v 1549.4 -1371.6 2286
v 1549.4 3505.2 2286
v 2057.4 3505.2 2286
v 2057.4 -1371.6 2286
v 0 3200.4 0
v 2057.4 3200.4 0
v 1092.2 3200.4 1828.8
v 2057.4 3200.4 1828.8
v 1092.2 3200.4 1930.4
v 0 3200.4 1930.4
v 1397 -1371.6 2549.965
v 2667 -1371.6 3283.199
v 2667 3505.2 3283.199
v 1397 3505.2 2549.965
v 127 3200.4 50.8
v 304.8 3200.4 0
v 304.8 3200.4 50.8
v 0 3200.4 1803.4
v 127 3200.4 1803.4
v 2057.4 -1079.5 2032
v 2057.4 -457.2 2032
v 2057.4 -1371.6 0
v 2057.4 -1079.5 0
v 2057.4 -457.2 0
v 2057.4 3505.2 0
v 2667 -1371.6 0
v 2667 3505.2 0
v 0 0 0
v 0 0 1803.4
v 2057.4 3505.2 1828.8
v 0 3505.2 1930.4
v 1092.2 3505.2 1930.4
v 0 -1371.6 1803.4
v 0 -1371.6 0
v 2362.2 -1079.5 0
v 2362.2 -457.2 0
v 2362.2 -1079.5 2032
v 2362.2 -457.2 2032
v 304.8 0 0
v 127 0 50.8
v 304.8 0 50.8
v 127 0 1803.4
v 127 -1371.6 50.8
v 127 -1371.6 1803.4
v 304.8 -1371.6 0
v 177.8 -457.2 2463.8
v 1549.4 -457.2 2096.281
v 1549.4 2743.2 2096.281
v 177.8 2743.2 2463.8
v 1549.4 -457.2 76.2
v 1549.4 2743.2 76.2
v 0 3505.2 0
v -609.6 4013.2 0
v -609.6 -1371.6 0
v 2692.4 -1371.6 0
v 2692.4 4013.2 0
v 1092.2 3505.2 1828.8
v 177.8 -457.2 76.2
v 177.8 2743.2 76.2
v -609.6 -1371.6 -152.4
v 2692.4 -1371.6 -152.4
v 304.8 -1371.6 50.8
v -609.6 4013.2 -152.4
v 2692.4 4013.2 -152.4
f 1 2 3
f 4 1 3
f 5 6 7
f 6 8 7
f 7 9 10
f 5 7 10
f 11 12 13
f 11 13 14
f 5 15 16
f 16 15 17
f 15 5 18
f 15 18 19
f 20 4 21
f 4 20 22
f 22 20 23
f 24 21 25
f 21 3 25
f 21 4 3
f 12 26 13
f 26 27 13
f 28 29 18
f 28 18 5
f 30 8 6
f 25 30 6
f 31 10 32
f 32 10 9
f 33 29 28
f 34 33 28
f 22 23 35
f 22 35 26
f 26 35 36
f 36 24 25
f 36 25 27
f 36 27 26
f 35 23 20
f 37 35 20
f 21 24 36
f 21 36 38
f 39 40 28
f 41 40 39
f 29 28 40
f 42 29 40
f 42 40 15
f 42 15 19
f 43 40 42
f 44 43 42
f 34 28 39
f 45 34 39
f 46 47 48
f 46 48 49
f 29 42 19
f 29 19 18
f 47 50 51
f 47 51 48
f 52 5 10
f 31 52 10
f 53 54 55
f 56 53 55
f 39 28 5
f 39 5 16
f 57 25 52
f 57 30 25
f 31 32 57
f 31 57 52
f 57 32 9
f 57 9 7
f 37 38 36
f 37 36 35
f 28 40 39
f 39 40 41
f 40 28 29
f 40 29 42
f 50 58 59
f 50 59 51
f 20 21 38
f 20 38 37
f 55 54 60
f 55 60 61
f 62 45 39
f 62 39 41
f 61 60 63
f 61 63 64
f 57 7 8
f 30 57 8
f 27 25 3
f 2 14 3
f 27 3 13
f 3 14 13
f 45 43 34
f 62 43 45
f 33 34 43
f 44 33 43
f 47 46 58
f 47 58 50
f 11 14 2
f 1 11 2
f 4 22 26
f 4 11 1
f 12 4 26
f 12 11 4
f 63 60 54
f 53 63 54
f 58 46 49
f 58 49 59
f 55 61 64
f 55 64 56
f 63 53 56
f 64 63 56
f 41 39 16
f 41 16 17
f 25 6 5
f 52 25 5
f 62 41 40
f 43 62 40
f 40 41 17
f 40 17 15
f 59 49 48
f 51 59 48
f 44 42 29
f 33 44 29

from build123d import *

# Parameters (mm, degrees)
F1_DEPTH  = 3200.4
F3_DEPTH  = 3505.2
F5_DEPTH  = 304.8
F8_DEPTH  = 1371.6
F9_W      = 3302
F9_H      = 152.4
F10_DEPTH = 5384.8
F12_DEPTH = 1371.6
F13_W     = 622.3
F13_H     = 2032
F14_DEPTH = 304.8
F17_DEPTH = 3200.4


with BuildPart() as f1:
    # F0 (on Front) → F1 (new body)
    with BuildSketch(Plane.XZ):
        Polygon((0, 1803.4), (0, 0), (304.8, 0), (304.8, 50.8), (127, 50.8), (127, 1803.4), align=None)
    extrude(amount=-F1_DEPTH)


with BuildPart() as f3:
    # F2 (on Front) → F3 (new body)
    with BuildSketch(Plane.XZ):
        Polygon((2057.4, 2286), (2057.4, 0), (2667, 0), (2667, 3283.1993849443), (1397, 2549.9645430735), (1549.4, 2286), align=None)
    extrude(amount=-F3_DEPTH)

    # F7 (on face) → F8 (join, through all)
    with BuildSketch(Plane.XZ):
        Polygon((1549.4, 2286), (2057.4, 2286), (2057.4, 0), (2667, 0), (2667, 3283.1993849443), (1397, 2549.9645430735), align=None)
    extrude(amount=F8_DEPTH)

    # F13 (on face) → F14 (cut)
    with BuildSketch(Plane(origin=(2057.4, 0, 0), x_dir=(0, -1, 0), z_dir=(-1, 0, 0))):
        with Locations((768.35, 1016)):
            Rectangle(F13_W, F13_H)
    extrude(amount=-F14_DEPTH, mode=Mode.SUBTRACT)


with BuildPart() as f5:
    # F4 (on face) → F5 (new body)
    with BuildSketch(Plane(origin=(0, 3200.4, 0), x_dir=(-1, 0, 0), z_dir=(0, 1, 0))):
        Polygon((-2057.4, 0), (0, 0), (0, 1930.4), (-1092.2, 1930.4), (-1092.2, 1828.8), (-2057.4, 1828.8), align=None)
    extrude(amount=F5_DEPTH)


with BuildPart() as f10:
    # F9 (on offset) → F10 (new body)
    with BuildSketch(Plane.XZ.offset(1371.6)):
        with Locations((1041.4, -76.2)):
            Rectangle(F9_W, F9_H)
    extrude(amount=-F10_DEPTH)


with BuildPart() as f12:
    # F11 (on face) → F12 (new body, through all)
    with BuildSketch(Plane.XZ):
        Polygon((304.8, 50.8), (127, 50.8), (127, 1803.4), (0, 1803.4), (0, 0), (304.8, 0), align=None)
    extrude(amount=F12_DEPTH)


with BuildPart() as f17:
    # F16 (on offset) → F17 (new body)
    with BuildSketch(Plane.XZ.offset(457.2)):
        Polygon((177.8, 2463.8), (177.8, 76.2), (1549.4, 76.2), (1549.4, 2096.2808876615), align=None)
    extrude(amount=-F17_DEPTH)


solid = Compound([f1.part, f3.part, f5.part, f10.part, f12.part, f17.part])
